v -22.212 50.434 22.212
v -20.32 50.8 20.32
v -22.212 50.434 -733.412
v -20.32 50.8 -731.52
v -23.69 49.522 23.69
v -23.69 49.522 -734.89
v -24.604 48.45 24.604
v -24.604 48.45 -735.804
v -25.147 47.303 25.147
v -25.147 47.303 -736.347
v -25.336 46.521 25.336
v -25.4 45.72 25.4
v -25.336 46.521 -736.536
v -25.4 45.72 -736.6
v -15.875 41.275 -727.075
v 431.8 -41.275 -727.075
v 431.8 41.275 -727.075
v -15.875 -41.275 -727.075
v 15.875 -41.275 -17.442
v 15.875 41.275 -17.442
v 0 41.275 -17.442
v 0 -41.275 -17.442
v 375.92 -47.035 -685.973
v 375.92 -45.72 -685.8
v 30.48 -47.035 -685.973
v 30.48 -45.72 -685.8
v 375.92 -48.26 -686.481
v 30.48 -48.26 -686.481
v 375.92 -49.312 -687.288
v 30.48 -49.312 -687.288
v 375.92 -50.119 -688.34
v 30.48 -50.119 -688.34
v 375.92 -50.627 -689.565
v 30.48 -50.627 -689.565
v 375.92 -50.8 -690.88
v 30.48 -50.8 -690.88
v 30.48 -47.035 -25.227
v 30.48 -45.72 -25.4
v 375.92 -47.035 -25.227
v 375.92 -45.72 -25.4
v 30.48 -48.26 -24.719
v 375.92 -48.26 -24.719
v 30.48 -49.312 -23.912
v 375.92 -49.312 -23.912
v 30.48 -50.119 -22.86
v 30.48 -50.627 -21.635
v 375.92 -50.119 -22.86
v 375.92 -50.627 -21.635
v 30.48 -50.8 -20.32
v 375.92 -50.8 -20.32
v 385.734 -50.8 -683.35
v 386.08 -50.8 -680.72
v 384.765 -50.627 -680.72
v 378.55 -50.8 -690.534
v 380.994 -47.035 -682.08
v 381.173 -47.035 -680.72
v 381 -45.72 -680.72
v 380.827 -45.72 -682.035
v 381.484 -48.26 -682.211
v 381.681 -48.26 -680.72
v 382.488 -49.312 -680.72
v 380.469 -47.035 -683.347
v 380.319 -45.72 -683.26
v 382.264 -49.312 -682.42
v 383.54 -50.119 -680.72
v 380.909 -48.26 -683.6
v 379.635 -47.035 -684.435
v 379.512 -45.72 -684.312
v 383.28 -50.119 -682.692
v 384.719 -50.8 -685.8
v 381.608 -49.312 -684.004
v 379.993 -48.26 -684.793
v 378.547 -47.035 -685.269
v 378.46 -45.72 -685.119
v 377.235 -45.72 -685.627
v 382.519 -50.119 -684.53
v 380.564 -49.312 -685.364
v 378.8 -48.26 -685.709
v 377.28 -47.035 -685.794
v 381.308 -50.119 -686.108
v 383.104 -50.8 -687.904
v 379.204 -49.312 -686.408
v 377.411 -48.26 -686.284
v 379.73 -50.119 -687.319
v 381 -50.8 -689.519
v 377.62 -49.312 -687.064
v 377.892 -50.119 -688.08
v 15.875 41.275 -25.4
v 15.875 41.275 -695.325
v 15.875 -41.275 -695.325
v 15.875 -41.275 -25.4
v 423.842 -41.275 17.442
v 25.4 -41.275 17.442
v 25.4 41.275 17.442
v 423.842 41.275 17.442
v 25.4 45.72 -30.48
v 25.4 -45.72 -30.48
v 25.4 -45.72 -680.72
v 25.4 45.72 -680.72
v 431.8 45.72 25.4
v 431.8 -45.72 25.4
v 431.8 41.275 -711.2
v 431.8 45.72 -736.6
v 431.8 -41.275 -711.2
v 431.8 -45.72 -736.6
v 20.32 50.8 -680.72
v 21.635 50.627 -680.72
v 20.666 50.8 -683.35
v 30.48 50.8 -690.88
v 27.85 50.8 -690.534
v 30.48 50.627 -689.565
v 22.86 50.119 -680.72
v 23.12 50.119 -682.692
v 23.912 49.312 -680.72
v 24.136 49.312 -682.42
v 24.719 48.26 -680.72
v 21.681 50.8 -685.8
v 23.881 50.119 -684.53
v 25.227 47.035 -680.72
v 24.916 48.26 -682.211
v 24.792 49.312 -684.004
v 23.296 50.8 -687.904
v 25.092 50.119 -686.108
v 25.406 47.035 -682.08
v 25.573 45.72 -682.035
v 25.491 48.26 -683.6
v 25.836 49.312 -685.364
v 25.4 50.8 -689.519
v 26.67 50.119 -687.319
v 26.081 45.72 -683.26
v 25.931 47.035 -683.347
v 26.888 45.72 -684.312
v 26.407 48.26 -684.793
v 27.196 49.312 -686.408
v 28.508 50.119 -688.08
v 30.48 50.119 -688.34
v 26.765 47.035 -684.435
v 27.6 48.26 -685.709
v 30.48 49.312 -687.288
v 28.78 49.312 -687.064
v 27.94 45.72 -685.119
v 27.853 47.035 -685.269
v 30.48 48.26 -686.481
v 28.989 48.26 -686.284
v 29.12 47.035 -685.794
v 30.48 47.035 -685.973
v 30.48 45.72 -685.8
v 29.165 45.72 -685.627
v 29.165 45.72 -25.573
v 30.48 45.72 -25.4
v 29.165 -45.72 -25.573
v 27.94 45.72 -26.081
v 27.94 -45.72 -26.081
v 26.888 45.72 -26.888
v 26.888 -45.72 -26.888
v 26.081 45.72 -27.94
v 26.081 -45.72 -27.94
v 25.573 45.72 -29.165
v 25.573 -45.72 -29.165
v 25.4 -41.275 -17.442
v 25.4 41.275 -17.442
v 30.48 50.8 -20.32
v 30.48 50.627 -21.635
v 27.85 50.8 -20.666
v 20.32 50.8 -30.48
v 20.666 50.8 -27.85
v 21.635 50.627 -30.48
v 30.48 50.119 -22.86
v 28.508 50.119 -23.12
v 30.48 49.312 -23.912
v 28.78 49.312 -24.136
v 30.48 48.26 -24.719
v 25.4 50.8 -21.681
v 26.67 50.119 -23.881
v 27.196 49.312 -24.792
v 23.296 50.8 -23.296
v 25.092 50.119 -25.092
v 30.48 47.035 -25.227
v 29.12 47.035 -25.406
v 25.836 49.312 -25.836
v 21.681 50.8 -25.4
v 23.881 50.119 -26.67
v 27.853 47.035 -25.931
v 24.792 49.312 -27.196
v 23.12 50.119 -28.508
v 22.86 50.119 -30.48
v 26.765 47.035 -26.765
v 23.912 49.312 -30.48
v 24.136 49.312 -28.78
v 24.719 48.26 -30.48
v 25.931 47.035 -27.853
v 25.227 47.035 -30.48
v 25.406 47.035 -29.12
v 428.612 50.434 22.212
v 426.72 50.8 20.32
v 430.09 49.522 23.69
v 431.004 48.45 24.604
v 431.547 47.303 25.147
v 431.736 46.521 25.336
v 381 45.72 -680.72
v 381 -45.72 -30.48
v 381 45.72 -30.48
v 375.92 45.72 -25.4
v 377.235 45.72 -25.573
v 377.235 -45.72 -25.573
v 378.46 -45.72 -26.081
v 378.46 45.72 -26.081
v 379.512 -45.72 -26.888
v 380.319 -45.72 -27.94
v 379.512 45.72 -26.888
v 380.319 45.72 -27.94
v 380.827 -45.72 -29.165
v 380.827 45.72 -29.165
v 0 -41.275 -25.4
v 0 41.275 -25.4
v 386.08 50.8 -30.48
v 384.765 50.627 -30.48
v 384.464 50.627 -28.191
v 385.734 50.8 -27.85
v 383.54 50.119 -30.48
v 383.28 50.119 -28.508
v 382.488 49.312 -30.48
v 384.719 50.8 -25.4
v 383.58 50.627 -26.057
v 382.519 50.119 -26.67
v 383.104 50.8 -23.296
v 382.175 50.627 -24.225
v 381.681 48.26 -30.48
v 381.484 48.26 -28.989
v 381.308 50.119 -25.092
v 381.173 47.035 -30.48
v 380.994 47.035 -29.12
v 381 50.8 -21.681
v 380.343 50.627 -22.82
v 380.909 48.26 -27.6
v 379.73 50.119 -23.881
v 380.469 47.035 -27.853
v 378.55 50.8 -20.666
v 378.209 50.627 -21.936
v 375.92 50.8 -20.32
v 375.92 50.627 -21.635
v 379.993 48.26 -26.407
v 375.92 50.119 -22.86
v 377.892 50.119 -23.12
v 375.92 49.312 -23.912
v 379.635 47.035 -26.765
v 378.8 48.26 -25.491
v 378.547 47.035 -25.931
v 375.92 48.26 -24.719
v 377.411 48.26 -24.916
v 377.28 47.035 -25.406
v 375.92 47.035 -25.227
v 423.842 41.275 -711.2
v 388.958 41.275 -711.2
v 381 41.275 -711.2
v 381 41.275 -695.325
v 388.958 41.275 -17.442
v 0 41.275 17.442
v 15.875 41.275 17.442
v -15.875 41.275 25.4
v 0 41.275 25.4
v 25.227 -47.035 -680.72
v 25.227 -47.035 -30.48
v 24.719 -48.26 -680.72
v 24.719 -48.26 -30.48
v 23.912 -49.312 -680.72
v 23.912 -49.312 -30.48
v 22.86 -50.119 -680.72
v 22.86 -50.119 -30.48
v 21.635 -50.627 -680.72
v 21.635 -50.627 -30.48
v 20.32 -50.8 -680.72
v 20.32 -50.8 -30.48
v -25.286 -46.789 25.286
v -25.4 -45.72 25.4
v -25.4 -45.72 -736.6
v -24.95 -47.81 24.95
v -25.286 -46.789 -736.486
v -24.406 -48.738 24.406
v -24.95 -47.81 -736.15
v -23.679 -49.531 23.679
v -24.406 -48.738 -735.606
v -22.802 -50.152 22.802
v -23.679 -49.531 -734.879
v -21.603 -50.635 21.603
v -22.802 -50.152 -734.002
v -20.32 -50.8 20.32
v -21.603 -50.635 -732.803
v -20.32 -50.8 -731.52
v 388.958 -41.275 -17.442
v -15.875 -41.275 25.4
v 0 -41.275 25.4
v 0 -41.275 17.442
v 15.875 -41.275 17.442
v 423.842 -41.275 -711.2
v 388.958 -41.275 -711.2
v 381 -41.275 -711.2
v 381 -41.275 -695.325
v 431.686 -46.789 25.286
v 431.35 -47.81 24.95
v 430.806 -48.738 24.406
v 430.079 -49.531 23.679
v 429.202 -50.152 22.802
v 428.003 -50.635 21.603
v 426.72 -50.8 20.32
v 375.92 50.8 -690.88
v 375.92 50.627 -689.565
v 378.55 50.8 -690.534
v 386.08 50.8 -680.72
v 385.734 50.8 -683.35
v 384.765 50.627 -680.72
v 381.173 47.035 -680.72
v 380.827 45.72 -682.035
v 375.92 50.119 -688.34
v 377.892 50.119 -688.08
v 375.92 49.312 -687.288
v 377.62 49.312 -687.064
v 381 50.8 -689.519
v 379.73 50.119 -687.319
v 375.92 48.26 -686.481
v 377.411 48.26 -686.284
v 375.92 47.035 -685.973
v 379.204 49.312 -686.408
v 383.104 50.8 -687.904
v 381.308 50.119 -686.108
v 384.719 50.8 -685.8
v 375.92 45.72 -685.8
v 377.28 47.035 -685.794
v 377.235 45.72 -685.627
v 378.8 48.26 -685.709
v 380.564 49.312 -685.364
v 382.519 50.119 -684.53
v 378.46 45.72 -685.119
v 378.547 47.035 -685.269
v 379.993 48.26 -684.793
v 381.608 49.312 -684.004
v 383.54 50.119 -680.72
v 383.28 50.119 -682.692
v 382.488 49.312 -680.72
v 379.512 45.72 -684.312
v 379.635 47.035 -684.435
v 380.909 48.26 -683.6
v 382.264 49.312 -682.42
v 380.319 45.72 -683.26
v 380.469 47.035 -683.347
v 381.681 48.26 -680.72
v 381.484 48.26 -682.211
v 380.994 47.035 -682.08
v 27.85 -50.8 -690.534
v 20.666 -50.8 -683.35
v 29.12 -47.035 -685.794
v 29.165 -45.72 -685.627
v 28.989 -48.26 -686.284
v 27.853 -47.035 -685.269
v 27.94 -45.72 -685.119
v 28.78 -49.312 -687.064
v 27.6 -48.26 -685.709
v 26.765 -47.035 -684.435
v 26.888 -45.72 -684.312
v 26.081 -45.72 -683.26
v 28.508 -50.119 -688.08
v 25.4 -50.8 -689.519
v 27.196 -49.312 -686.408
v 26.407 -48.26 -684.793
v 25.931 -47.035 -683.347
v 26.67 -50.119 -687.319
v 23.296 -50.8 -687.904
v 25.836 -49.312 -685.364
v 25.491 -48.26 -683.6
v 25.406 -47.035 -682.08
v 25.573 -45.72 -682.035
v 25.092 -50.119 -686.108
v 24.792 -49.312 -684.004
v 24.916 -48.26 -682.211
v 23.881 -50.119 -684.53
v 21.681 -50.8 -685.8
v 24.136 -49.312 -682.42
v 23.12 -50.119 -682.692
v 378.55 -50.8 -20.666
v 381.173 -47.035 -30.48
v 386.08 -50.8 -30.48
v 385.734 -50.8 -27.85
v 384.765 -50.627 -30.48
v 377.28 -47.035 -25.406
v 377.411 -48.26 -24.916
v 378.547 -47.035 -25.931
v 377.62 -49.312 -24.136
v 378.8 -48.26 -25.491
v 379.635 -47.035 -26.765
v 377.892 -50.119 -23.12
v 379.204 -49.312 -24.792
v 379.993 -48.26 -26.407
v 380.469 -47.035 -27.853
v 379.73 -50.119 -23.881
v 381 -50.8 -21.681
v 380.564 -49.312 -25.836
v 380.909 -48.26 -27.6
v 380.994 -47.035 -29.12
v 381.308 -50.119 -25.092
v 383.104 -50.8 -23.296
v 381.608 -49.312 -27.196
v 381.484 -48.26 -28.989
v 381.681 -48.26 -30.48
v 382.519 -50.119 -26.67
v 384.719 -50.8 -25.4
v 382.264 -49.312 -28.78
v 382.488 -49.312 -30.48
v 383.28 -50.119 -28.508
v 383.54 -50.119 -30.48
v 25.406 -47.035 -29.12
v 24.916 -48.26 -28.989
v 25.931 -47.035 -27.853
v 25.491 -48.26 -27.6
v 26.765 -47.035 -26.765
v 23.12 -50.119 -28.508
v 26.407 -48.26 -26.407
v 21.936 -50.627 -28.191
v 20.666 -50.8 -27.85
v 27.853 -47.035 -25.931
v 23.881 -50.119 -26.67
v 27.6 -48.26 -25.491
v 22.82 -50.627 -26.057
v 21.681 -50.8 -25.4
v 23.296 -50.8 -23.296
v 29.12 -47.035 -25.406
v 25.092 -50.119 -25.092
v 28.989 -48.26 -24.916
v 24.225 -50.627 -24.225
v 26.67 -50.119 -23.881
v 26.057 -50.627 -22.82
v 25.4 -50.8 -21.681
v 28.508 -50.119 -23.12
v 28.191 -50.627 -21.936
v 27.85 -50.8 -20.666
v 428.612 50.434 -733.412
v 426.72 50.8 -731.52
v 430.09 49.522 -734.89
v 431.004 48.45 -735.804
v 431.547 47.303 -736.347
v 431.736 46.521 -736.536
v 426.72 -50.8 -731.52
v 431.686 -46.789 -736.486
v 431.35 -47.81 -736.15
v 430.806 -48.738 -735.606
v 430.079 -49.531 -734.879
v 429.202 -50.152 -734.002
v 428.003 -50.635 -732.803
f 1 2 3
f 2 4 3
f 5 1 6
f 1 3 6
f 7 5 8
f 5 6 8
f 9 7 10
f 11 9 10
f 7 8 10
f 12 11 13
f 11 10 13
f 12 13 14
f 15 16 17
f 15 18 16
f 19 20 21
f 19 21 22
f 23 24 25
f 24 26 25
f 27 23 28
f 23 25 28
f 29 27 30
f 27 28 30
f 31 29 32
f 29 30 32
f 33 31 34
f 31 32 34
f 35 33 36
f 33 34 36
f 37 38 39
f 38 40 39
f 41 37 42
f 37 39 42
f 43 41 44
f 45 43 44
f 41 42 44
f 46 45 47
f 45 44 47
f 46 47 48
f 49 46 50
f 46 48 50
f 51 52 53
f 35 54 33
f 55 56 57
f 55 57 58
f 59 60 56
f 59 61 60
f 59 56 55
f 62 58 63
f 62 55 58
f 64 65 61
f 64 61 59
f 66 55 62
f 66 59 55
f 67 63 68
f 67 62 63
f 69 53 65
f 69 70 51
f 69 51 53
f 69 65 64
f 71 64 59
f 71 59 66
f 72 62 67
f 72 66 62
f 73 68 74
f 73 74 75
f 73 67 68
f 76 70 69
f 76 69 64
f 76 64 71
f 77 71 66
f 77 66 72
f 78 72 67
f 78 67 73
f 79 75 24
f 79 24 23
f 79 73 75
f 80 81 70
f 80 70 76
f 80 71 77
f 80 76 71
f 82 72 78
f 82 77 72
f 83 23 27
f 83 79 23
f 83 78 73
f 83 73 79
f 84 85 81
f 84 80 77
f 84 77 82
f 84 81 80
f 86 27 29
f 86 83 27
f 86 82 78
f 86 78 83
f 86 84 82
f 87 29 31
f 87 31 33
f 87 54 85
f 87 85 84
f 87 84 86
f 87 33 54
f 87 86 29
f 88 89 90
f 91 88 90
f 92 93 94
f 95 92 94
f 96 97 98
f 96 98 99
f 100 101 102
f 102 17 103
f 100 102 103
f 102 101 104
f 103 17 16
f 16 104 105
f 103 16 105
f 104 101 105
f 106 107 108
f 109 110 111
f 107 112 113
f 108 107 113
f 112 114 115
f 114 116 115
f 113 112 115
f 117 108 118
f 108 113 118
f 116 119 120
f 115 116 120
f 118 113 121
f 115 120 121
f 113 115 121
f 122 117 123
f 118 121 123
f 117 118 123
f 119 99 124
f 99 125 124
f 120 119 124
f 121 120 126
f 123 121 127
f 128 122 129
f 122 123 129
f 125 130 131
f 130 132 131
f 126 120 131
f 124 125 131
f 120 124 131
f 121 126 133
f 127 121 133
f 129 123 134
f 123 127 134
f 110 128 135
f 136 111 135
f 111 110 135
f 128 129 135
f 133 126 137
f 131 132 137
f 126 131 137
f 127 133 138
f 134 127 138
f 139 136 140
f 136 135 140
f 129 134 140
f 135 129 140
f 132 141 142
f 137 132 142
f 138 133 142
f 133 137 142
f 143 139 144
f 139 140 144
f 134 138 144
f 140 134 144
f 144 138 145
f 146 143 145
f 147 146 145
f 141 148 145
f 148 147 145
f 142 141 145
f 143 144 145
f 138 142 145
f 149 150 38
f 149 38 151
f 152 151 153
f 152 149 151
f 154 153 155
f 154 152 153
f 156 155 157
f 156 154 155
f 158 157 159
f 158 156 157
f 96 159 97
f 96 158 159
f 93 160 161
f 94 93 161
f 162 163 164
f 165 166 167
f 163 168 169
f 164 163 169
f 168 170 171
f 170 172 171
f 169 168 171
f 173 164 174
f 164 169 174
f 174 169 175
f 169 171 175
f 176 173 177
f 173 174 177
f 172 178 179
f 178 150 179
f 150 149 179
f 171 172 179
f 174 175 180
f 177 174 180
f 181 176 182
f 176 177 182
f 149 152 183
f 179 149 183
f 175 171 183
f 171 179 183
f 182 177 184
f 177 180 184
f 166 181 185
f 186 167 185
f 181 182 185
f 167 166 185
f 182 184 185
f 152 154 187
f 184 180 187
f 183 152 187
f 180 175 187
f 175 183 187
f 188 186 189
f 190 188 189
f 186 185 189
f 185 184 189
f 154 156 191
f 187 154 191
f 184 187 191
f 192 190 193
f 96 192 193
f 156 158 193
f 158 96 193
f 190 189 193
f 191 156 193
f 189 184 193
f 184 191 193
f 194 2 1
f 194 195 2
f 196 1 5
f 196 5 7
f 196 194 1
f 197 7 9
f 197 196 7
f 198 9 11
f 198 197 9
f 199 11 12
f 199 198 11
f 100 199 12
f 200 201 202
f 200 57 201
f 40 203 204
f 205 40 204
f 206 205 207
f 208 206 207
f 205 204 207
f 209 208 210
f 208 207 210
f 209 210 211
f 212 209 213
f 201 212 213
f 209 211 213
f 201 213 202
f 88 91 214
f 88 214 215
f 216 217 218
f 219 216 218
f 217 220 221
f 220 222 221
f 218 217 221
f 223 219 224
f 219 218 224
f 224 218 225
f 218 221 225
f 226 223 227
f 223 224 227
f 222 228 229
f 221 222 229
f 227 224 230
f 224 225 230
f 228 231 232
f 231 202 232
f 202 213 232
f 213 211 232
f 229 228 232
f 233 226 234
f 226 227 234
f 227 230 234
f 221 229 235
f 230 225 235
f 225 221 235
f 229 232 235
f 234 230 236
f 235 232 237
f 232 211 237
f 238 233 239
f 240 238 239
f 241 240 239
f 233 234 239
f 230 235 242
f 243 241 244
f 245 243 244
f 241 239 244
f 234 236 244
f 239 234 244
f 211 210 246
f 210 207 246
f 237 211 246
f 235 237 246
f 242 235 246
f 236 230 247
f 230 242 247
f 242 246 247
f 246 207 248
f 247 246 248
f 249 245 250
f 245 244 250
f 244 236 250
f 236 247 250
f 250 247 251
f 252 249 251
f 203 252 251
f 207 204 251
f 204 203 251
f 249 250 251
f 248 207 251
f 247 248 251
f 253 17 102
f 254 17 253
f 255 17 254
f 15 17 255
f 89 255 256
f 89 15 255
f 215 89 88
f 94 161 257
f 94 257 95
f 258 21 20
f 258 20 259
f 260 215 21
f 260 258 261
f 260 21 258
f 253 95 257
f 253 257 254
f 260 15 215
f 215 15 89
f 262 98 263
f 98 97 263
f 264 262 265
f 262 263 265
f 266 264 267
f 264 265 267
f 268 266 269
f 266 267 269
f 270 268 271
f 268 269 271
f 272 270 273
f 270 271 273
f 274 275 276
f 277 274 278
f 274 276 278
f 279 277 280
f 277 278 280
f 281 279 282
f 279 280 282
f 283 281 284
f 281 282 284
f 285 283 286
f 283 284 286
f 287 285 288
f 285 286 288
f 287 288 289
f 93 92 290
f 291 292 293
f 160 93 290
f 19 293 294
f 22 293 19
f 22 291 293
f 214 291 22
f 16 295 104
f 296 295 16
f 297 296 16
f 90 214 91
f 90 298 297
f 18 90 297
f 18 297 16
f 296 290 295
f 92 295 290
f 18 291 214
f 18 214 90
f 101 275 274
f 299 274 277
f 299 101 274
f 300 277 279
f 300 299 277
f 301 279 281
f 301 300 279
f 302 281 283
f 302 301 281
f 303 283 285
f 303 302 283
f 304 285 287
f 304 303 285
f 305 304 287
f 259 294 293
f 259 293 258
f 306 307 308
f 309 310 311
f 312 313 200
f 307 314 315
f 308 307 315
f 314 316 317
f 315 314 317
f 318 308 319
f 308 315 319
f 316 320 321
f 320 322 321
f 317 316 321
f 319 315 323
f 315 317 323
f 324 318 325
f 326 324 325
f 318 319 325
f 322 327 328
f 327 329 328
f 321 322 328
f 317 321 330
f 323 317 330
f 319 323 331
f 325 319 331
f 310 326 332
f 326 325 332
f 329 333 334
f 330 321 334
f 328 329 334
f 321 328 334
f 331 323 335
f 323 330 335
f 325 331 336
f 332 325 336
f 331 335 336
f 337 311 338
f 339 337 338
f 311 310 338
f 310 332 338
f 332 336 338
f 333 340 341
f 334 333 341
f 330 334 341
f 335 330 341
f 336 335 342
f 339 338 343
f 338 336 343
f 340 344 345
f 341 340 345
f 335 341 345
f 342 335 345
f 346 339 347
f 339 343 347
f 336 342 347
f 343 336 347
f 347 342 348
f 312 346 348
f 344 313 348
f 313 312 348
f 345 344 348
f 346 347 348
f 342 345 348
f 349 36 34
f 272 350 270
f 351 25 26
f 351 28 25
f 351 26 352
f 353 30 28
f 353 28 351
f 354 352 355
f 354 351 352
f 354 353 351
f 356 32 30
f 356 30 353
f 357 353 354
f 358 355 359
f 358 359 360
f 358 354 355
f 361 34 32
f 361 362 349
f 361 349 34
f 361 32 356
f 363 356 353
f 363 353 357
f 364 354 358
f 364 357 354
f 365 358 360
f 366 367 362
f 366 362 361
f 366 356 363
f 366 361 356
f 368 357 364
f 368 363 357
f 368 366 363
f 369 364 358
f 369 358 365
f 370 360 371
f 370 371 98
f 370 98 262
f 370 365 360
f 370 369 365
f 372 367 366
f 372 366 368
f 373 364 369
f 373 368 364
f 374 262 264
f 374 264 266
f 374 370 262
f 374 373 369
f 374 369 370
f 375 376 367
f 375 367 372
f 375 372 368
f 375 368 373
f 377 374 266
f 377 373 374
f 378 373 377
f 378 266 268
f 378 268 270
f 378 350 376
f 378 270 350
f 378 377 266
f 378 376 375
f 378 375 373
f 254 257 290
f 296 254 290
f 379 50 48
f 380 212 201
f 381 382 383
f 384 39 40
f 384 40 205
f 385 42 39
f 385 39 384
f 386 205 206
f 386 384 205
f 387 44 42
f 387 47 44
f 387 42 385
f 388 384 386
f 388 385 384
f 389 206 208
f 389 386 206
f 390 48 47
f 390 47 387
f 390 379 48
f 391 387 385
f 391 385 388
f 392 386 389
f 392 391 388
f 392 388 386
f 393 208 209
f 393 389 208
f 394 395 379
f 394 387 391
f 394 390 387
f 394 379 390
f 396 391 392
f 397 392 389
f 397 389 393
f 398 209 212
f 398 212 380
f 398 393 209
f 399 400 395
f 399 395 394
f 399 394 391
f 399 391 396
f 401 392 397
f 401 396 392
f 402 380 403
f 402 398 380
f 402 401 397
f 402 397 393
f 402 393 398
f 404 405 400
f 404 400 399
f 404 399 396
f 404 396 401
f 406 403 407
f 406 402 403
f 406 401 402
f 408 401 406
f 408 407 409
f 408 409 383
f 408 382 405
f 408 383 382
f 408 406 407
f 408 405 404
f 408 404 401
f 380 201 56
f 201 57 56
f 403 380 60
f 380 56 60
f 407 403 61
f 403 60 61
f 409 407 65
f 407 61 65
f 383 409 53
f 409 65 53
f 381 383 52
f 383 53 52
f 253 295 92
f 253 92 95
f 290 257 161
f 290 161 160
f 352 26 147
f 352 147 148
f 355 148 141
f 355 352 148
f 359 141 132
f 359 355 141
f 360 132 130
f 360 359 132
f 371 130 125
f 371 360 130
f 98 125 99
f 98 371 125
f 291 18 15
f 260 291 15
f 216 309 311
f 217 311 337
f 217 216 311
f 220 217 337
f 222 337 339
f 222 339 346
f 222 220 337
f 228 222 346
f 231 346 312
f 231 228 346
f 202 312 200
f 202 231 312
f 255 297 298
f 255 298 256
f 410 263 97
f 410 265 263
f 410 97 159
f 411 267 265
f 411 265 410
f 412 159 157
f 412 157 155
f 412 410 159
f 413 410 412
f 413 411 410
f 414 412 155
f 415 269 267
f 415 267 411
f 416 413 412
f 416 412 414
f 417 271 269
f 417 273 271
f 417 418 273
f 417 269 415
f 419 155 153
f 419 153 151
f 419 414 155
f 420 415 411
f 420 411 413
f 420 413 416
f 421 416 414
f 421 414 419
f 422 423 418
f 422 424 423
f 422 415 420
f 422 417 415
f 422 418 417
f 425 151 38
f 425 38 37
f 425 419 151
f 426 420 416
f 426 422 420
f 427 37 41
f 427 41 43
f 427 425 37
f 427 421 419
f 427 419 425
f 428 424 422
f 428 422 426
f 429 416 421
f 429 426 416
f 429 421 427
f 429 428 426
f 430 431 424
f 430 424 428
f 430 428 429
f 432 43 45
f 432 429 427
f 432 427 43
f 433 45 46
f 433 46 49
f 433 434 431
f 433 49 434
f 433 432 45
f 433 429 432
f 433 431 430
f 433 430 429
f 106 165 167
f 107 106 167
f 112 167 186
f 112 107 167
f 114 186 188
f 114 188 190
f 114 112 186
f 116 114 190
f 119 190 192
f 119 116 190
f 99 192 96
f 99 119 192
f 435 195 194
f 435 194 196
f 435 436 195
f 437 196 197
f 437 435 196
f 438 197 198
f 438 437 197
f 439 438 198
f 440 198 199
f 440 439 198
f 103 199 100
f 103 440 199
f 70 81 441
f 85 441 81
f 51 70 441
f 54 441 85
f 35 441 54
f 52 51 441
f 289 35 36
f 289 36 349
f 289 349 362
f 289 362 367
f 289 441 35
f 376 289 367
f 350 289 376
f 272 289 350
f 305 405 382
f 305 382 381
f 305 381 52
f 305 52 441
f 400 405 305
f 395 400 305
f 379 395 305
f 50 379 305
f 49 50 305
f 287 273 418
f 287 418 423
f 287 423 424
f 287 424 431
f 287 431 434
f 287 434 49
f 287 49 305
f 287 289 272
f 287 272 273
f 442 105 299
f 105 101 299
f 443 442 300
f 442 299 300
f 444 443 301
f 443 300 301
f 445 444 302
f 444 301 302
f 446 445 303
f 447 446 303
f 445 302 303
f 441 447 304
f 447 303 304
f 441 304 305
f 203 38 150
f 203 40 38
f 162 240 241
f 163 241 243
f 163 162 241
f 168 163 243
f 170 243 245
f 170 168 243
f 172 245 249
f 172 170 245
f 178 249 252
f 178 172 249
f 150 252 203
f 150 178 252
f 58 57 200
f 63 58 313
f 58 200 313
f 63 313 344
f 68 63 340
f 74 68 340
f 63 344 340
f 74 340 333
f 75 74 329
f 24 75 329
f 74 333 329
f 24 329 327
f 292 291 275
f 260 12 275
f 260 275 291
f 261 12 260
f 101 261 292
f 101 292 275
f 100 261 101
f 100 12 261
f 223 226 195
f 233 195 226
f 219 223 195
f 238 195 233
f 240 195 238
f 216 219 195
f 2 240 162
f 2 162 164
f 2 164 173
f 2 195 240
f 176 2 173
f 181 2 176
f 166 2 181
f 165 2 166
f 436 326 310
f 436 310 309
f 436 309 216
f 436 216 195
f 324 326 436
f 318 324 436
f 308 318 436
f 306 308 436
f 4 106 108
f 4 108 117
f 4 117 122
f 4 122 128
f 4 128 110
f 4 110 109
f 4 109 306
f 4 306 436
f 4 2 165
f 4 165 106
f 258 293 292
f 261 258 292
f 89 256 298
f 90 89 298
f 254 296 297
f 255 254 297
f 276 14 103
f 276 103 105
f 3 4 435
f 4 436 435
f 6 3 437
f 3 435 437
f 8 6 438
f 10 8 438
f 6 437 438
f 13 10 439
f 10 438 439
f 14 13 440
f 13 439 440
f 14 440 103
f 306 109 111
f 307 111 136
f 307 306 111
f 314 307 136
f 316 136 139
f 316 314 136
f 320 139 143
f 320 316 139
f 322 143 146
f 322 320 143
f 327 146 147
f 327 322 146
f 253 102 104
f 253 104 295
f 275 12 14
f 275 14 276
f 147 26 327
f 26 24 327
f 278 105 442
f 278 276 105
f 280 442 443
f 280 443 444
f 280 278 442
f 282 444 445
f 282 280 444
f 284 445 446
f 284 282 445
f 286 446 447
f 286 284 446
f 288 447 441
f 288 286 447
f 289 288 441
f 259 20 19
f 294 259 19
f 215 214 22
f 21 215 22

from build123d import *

# Parameters (mm, degrees)
F1_W     = 101.6
F1_H     = 50.8
F1_W_2   = 82.55
F1_H_2   = 34.8846255165
F4_W     = 50.8
F4_H     = 101.6
F4_W_2   = 31.75
F4_H_2   = 82.55
F6_DEPTH = 50.8
F7_F1_R  = 5.08
F7_F2_R  = 5.08
F8_R     = 5.08


with BuildPart() as f2:
    # F2: sweep along a path in F0
    with BuildLine(Plane.XZ) as f2_path:
        Line((0, 0), (406.4, 0))
        Line((406.4, 0), (406.4, -711.2))
    # F1 (on Right) → F2 (sweep)
    with BuildSketch(Plane.YZ):
        Rectangle(F1_W, F1_H)
        Rectangle(F1_W_2, F1_H_2, mode=Mode.SUBTRACT)
    sweep(path=f2_path.line, transition=Transition.RIGHT)

    # F5: sweep along a path in F0
    with BuildLine(Plane.XZ) as f5_path:
        Line((0, 0), (0, -711.2))
        Line((0, -711.2), (406.4, -711.2))
    # F4 (on offset) → F5 (sweep)
    with BuildSketch(Plane.XY.offset(25.4)):
        Rectangle(F4_W, F4_H)
        Rectangle(F4_W_2, F4_H_2, mode=Mode.SUBTRACT)
    sweep(path=f5_path.line, transition=Transition.RIGHT)

    # F6 (add): a face of the model
    f6_faces = [f2.faces().sort_by_distance(p)[0] for p in [
        (381, 0, -728.8136904762),
    ]]
    extrude(f6_faces, amount=F6_DEPTH)

    # F7: fillet of radius 5.08 on 6 edges, made by hand

    # F7_f1
    f7_f1_edges = [f2.edges().sort_by_distance(p)[0] for p in [
        (381, 0, -685.8),
        (25.4, 0, -685.8),
        (25.4, 0, -25.4),
        (381, 0, -25.4),
    ]]
    fillet(f7_f1_edges, radius=F7_F1_R)

    # F7_f2
    f7_f2_edges = [f2.edges().sort_by_distance(p)[0] for p in [
        (203.2, -50.8, -25.4),
        (25.4, 50.8, -355.6),
        (26.8878975516, 50.8, -26.8878975516),
        (26.8878975516, 50.8, -684.3121024484),
        (26.8878975516, -50.8, -26.8878975516),
        (379.5121024484, -50.8, -26.8878975516),
    ]]
    fillet(f7_f2_edges, radius=F7_F2_R)

    # F8
    f8_edges = [f2.edges().sort_by_distance(p)[0] for p in [
        (203.2, -50.8, 25.4),
        (-25.4, -50.8, -355.6),
        (431.8, -50.8, -355.6),
        (203.2, -50.8, -736.6),
        (-25.4, 50.8, -355.6),
        (203.2, 50.8, -736.6),
        (431.8, 50.8, -355.6),
        (203.2, 50.8, 25.4),
    ]]
    fillet(f8_edges, radius=F8_R)


solid = f2.part
